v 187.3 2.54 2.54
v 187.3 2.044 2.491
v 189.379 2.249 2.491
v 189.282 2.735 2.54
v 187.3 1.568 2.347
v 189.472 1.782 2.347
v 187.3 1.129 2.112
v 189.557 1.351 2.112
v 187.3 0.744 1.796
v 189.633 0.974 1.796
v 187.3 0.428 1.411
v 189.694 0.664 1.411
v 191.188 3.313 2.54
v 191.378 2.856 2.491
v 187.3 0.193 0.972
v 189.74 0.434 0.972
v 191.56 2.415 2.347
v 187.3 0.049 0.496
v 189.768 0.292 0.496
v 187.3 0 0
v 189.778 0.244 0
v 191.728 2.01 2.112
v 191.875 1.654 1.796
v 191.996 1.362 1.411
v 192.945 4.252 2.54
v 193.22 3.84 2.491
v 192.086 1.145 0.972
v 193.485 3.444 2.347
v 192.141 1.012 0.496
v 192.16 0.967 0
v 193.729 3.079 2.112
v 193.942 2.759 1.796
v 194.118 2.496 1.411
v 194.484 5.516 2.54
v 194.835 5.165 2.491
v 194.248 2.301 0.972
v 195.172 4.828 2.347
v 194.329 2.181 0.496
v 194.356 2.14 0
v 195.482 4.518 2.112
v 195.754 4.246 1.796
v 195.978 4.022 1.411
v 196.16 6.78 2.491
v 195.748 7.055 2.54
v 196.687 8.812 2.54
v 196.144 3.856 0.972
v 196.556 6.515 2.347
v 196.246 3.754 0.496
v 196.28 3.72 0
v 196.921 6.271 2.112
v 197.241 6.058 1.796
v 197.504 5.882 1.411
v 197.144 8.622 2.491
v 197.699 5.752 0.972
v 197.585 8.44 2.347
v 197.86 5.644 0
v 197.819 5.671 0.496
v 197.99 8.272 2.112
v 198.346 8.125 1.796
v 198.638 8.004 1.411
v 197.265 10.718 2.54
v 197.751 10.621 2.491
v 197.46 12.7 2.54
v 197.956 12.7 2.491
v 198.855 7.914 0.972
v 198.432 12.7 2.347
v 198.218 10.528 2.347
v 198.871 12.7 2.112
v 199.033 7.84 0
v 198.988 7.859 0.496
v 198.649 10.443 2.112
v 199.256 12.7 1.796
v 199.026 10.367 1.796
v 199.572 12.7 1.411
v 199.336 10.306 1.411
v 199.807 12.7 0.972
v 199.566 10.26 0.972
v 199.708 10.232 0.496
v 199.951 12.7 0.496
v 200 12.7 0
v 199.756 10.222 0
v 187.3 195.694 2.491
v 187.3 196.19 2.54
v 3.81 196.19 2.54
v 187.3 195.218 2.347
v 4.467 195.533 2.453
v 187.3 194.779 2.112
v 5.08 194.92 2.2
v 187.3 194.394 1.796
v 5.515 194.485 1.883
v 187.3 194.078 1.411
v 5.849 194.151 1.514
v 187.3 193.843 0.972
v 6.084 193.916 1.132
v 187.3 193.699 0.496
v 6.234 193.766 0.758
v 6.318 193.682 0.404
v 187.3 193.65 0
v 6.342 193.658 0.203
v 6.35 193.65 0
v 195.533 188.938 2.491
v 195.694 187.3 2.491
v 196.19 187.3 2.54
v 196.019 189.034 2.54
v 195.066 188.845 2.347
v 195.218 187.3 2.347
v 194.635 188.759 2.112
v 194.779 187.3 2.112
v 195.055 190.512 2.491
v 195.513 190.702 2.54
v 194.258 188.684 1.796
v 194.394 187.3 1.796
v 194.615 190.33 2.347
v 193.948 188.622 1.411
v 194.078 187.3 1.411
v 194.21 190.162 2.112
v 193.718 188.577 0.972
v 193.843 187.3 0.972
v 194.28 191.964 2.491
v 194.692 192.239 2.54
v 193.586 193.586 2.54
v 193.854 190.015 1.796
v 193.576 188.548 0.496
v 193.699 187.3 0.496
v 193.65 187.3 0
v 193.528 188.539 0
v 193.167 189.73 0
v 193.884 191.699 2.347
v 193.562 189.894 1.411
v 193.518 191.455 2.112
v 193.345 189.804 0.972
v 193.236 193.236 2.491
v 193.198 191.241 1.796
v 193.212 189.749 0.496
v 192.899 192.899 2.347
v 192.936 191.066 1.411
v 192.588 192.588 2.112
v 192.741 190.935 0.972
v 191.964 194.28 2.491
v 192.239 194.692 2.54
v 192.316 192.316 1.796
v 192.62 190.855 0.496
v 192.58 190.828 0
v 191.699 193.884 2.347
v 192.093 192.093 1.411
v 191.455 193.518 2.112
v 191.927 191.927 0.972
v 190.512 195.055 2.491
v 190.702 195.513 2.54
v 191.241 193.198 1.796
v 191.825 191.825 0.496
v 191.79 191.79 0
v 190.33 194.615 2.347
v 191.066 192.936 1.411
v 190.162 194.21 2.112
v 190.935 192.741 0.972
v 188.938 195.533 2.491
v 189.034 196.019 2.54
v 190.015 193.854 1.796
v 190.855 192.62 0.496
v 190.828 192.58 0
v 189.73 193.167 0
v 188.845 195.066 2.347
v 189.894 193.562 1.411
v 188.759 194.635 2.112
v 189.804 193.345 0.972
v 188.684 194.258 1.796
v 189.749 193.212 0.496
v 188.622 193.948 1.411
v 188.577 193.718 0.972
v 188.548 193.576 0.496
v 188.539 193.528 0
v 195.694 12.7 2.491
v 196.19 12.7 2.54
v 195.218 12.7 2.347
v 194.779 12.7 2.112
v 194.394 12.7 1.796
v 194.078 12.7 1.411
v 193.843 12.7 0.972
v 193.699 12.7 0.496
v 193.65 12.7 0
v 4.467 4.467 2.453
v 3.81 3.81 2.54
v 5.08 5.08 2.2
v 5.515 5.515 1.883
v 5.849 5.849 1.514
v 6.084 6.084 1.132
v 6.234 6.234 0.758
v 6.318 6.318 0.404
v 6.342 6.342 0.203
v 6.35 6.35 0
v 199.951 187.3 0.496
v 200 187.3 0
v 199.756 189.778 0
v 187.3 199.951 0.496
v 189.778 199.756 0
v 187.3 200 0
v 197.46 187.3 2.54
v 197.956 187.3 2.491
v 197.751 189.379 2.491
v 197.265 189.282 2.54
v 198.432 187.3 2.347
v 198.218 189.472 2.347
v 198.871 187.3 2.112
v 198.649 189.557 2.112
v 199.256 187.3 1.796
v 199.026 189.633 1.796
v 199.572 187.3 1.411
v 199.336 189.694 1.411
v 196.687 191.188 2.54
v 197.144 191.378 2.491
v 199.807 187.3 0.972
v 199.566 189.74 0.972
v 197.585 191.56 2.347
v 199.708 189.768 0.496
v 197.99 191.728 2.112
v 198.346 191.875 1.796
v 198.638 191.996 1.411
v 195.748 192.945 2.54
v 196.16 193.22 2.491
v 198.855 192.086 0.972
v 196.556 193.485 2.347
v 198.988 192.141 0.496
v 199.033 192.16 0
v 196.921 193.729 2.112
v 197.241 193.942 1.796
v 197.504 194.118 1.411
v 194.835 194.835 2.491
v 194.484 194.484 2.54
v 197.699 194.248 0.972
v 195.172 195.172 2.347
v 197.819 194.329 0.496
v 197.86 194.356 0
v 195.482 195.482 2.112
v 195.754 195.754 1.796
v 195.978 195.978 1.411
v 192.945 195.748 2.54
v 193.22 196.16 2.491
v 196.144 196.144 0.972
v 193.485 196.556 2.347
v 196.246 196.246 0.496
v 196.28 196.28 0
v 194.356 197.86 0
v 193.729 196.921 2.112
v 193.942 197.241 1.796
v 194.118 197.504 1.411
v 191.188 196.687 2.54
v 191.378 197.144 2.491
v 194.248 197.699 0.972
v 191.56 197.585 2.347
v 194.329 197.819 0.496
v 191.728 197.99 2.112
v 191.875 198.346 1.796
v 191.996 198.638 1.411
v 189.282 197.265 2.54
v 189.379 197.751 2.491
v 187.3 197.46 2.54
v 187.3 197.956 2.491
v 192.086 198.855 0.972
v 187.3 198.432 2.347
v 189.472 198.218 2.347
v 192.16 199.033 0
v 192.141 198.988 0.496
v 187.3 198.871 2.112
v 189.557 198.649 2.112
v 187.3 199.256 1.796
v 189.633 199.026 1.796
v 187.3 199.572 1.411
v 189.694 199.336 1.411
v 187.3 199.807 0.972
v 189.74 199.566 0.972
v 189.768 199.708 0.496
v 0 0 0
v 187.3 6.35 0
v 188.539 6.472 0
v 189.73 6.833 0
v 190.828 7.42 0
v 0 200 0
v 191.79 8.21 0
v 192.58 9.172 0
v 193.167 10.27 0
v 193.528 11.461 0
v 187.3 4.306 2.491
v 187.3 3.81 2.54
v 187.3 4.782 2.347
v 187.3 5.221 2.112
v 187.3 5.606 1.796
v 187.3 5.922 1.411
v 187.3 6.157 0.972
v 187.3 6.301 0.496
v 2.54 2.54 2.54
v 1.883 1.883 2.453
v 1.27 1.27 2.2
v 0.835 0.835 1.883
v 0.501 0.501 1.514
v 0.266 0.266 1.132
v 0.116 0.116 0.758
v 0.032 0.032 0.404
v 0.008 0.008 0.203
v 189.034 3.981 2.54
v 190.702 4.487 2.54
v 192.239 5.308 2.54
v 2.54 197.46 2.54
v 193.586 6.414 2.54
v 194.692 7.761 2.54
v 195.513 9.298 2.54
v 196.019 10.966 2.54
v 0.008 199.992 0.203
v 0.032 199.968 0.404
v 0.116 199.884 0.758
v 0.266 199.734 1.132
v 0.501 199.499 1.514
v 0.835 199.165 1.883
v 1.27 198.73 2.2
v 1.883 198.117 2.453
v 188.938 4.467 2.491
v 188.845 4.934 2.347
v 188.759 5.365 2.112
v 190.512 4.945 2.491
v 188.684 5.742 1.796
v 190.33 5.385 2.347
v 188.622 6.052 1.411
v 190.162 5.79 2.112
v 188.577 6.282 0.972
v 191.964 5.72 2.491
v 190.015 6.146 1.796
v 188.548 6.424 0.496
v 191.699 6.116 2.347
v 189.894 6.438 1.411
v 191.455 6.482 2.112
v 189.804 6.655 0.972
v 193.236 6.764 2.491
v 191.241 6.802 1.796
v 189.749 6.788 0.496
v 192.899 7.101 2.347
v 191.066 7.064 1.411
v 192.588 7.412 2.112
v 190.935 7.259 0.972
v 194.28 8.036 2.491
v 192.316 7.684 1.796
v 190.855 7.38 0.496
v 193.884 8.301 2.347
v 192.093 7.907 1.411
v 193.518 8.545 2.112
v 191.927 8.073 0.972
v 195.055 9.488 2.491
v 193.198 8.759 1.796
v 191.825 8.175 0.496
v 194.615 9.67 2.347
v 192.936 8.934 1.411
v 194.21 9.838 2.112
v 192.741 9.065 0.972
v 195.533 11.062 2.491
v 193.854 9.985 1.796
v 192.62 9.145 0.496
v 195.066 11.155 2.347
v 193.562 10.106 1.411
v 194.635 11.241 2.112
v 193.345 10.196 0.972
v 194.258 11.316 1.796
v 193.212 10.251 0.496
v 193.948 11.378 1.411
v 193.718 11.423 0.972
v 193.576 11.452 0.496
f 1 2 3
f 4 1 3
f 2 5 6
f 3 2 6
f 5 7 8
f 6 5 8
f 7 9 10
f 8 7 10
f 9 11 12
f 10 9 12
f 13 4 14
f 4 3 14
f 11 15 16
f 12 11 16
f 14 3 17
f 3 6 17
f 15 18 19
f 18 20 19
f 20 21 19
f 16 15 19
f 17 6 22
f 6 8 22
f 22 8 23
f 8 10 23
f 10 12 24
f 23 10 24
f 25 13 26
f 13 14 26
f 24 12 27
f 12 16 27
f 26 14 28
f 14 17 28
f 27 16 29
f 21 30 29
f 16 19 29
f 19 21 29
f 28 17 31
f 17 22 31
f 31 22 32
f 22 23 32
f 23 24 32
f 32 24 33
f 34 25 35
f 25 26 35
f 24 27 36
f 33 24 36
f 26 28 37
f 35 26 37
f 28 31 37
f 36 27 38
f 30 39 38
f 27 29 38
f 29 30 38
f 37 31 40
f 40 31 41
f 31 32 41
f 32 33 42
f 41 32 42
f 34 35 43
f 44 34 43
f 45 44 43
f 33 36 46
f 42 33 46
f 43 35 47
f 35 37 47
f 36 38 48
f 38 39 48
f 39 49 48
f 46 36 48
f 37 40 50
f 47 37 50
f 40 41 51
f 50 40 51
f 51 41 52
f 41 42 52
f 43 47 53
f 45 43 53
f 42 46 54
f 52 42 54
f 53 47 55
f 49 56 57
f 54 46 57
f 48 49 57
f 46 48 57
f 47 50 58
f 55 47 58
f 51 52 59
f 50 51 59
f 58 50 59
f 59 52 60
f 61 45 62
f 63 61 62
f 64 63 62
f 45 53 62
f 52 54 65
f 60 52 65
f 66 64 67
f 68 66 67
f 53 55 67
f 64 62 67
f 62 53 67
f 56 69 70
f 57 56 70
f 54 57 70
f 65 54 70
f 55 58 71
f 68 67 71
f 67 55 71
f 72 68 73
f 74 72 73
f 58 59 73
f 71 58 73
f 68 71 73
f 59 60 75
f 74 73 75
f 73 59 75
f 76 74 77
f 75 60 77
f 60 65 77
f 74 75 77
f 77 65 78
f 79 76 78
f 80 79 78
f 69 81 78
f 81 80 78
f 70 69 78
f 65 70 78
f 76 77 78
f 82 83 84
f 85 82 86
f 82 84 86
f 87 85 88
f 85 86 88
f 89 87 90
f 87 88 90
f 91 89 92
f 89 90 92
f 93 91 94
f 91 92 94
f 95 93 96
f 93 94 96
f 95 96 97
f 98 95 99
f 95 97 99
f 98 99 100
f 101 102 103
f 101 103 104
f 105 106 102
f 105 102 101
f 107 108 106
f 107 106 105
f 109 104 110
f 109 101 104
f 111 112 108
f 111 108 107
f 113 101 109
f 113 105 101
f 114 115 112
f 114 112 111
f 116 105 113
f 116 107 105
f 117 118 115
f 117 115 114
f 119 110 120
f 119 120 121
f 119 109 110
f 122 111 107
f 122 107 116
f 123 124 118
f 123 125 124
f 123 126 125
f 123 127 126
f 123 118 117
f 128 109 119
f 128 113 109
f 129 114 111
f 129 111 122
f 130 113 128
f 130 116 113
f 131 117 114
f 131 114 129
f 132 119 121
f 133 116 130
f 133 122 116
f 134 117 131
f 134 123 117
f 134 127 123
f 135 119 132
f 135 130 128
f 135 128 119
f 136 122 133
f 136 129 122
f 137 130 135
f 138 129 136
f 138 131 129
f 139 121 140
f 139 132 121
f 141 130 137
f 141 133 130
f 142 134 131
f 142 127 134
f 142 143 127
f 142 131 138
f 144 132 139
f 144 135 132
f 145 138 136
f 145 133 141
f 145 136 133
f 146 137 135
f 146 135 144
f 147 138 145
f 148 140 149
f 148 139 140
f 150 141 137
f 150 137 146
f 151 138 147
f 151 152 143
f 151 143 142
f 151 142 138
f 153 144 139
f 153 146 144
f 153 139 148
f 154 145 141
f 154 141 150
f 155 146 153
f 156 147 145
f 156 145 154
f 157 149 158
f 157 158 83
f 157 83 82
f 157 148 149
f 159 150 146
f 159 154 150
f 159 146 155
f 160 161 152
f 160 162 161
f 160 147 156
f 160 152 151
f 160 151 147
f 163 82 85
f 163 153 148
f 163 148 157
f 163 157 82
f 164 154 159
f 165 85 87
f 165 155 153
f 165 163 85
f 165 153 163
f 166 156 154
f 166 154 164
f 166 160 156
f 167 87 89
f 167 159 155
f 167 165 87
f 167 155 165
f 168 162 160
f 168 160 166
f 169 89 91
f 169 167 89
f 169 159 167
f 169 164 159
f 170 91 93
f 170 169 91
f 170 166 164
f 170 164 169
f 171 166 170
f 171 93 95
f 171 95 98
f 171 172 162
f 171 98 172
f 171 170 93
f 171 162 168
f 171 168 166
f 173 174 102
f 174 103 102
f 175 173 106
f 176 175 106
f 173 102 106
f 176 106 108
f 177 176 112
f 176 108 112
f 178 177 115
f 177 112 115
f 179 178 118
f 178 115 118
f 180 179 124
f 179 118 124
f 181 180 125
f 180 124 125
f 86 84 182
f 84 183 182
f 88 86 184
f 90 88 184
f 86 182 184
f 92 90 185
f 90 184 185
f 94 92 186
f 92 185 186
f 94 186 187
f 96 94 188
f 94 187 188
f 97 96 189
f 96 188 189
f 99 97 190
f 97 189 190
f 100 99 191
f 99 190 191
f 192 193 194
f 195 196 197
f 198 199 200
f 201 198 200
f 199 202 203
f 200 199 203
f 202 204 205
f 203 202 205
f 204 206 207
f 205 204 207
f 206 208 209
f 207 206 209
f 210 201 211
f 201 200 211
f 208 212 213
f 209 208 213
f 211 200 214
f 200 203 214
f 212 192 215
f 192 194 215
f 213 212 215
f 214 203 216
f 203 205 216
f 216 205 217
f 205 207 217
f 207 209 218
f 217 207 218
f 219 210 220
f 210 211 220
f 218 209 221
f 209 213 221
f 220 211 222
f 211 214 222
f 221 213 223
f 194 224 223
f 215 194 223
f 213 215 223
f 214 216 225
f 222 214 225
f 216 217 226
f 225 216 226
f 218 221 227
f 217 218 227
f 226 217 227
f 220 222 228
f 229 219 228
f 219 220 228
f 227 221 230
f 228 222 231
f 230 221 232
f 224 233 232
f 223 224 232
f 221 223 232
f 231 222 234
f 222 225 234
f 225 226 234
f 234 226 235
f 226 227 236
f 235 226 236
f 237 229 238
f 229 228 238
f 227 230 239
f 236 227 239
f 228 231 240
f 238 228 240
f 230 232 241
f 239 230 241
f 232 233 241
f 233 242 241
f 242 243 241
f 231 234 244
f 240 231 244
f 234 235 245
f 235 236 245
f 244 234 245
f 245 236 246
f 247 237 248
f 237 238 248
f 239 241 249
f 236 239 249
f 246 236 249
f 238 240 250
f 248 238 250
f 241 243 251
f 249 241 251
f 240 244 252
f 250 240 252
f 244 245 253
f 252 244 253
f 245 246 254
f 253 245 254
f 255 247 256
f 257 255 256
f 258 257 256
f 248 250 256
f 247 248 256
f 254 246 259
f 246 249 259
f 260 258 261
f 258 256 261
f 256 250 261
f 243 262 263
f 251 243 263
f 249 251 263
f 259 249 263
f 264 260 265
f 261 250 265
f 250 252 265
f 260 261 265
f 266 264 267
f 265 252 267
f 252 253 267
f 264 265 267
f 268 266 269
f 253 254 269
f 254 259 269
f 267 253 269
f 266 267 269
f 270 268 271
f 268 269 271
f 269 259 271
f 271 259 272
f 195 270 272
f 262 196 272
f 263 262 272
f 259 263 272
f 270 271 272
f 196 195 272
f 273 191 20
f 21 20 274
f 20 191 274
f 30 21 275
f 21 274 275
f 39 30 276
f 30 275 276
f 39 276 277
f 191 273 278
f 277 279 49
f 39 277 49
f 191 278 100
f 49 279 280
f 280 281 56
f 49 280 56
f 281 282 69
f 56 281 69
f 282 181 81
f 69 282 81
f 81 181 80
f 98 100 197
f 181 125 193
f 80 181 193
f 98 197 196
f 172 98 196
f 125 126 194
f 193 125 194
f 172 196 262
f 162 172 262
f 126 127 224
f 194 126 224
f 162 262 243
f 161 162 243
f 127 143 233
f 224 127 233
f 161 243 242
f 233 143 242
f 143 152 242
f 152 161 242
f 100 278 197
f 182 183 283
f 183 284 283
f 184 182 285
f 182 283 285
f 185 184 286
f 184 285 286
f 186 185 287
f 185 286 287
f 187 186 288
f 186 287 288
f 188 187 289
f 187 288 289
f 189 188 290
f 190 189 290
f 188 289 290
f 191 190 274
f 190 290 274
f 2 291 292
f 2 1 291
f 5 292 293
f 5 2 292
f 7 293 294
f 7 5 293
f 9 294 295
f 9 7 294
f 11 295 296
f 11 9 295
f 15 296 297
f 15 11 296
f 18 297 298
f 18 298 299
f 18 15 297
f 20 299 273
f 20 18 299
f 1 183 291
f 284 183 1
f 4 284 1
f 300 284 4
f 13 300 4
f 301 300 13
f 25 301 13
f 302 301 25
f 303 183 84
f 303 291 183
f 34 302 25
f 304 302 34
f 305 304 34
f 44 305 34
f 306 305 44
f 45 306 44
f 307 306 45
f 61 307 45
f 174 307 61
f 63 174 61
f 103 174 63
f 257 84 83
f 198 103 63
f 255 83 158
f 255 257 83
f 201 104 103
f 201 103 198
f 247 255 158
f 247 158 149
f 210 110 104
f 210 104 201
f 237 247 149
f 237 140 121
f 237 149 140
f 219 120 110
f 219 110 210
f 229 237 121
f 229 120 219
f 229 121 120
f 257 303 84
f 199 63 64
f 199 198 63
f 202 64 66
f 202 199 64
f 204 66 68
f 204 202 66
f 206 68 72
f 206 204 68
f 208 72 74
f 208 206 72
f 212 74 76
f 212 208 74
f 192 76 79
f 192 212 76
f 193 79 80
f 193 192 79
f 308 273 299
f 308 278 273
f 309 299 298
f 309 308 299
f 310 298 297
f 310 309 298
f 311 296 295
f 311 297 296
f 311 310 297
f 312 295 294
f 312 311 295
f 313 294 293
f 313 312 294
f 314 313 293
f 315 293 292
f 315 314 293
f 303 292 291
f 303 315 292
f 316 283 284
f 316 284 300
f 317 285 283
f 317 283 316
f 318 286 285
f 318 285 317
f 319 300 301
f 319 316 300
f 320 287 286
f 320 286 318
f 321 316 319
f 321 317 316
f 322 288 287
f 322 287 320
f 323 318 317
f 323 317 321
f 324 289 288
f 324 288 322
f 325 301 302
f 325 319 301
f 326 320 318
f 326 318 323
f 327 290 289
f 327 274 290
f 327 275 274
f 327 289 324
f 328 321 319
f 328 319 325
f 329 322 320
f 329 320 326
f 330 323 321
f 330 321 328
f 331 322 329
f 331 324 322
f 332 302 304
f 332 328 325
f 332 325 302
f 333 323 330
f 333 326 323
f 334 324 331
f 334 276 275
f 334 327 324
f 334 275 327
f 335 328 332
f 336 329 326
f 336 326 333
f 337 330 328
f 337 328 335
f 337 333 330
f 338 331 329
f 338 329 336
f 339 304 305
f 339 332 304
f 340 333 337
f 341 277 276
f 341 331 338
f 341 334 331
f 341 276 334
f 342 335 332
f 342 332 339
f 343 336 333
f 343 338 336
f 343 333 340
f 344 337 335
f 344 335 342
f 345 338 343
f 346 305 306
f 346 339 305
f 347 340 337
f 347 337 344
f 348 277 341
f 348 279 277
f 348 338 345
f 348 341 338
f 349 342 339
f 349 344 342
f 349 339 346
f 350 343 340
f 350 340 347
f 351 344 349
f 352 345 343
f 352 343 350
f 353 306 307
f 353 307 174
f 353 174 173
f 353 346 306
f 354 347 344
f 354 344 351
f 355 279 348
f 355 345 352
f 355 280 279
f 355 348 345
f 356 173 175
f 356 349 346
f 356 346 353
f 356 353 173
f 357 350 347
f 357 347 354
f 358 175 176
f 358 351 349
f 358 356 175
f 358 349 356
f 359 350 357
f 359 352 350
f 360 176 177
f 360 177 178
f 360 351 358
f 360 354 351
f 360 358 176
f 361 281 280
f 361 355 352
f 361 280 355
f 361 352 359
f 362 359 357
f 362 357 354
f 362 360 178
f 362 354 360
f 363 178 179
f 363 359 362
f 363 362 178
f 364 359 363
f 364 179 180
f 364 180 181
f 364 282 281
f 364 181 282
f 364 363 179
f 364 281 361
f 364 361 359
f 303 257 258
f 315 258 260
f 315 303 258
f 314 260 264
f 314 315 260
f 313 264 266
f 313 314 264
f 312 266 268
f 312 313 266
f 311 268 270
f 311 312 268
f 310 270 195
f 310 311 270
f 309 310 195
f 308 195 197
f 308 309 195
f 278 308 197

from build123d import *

# Parameters (mm, degrees)
F0_W     = 200
F0_H     = 200
F1_DEPTH = 2.54
F2_R     = 12.7
F4_DEPTH = 2.541
F5_R     = 2.53999


# Not quite as in the source:
# - a fillet or chamfer is up to 0.001 mm smaller than in the source, because OpenCascade refuses the exact size


with BuildPart() as f1:
    # F0 (on Top) → F1 (new body)
    with BuildSketch(Plane.XY):
        with Locations((100, 100)):
            Rectangle(F0_W, F0_H)
    extrude(amount=F1_DEPTH)

    # F2
    f2_edges = [f1.edges().sort_by_distance(p)[0] for p in [
        (200, 0, 1.27),
        (200, 200, 1.27),
    ]]
    fillet(f2_edges, radius=F2_R)

    # F3 (on face) → F4 (cut, through all)
    with BuildSketch(Plane.XY.offset(2.54)):
        with BuildLine():
            Line((6.35, 193.65), (6.35, 6.35))
            Line((6.35, 6.35), (187.3, 6.35))
            ThreePointArc((187.3, 6.35), (191.7901280605, 8.2098719395), (193.65, 12.7))
            Line((193.65, 12.7), (193.65, 187.3))
            ThreePointArc((193.65, 187.3), (191.7901280605, 191.7901280605), (187.3, 193.65))
            Line((187.3, 193.65), (6.35, 193.65))
        make_face()
    extrude(amount=-F4_DEPTH, mode=Mode.SUBTRACT)

    # F5 (radius 2.54 in the source; OpenCascade refuses exactly that, so slightly less here)
    f5_edges = [f1.edges().sort_by_distance(p)[0] for p in [
        (96.825, 193.65, 2.54),
        (6.35, 100, 2.54),
        (196.280256, 196.280256, 2.54),
        (0, 100, 2.54),
    ]]
    fillet(f5_edges, radius=F5_R)


solid = f1.part
